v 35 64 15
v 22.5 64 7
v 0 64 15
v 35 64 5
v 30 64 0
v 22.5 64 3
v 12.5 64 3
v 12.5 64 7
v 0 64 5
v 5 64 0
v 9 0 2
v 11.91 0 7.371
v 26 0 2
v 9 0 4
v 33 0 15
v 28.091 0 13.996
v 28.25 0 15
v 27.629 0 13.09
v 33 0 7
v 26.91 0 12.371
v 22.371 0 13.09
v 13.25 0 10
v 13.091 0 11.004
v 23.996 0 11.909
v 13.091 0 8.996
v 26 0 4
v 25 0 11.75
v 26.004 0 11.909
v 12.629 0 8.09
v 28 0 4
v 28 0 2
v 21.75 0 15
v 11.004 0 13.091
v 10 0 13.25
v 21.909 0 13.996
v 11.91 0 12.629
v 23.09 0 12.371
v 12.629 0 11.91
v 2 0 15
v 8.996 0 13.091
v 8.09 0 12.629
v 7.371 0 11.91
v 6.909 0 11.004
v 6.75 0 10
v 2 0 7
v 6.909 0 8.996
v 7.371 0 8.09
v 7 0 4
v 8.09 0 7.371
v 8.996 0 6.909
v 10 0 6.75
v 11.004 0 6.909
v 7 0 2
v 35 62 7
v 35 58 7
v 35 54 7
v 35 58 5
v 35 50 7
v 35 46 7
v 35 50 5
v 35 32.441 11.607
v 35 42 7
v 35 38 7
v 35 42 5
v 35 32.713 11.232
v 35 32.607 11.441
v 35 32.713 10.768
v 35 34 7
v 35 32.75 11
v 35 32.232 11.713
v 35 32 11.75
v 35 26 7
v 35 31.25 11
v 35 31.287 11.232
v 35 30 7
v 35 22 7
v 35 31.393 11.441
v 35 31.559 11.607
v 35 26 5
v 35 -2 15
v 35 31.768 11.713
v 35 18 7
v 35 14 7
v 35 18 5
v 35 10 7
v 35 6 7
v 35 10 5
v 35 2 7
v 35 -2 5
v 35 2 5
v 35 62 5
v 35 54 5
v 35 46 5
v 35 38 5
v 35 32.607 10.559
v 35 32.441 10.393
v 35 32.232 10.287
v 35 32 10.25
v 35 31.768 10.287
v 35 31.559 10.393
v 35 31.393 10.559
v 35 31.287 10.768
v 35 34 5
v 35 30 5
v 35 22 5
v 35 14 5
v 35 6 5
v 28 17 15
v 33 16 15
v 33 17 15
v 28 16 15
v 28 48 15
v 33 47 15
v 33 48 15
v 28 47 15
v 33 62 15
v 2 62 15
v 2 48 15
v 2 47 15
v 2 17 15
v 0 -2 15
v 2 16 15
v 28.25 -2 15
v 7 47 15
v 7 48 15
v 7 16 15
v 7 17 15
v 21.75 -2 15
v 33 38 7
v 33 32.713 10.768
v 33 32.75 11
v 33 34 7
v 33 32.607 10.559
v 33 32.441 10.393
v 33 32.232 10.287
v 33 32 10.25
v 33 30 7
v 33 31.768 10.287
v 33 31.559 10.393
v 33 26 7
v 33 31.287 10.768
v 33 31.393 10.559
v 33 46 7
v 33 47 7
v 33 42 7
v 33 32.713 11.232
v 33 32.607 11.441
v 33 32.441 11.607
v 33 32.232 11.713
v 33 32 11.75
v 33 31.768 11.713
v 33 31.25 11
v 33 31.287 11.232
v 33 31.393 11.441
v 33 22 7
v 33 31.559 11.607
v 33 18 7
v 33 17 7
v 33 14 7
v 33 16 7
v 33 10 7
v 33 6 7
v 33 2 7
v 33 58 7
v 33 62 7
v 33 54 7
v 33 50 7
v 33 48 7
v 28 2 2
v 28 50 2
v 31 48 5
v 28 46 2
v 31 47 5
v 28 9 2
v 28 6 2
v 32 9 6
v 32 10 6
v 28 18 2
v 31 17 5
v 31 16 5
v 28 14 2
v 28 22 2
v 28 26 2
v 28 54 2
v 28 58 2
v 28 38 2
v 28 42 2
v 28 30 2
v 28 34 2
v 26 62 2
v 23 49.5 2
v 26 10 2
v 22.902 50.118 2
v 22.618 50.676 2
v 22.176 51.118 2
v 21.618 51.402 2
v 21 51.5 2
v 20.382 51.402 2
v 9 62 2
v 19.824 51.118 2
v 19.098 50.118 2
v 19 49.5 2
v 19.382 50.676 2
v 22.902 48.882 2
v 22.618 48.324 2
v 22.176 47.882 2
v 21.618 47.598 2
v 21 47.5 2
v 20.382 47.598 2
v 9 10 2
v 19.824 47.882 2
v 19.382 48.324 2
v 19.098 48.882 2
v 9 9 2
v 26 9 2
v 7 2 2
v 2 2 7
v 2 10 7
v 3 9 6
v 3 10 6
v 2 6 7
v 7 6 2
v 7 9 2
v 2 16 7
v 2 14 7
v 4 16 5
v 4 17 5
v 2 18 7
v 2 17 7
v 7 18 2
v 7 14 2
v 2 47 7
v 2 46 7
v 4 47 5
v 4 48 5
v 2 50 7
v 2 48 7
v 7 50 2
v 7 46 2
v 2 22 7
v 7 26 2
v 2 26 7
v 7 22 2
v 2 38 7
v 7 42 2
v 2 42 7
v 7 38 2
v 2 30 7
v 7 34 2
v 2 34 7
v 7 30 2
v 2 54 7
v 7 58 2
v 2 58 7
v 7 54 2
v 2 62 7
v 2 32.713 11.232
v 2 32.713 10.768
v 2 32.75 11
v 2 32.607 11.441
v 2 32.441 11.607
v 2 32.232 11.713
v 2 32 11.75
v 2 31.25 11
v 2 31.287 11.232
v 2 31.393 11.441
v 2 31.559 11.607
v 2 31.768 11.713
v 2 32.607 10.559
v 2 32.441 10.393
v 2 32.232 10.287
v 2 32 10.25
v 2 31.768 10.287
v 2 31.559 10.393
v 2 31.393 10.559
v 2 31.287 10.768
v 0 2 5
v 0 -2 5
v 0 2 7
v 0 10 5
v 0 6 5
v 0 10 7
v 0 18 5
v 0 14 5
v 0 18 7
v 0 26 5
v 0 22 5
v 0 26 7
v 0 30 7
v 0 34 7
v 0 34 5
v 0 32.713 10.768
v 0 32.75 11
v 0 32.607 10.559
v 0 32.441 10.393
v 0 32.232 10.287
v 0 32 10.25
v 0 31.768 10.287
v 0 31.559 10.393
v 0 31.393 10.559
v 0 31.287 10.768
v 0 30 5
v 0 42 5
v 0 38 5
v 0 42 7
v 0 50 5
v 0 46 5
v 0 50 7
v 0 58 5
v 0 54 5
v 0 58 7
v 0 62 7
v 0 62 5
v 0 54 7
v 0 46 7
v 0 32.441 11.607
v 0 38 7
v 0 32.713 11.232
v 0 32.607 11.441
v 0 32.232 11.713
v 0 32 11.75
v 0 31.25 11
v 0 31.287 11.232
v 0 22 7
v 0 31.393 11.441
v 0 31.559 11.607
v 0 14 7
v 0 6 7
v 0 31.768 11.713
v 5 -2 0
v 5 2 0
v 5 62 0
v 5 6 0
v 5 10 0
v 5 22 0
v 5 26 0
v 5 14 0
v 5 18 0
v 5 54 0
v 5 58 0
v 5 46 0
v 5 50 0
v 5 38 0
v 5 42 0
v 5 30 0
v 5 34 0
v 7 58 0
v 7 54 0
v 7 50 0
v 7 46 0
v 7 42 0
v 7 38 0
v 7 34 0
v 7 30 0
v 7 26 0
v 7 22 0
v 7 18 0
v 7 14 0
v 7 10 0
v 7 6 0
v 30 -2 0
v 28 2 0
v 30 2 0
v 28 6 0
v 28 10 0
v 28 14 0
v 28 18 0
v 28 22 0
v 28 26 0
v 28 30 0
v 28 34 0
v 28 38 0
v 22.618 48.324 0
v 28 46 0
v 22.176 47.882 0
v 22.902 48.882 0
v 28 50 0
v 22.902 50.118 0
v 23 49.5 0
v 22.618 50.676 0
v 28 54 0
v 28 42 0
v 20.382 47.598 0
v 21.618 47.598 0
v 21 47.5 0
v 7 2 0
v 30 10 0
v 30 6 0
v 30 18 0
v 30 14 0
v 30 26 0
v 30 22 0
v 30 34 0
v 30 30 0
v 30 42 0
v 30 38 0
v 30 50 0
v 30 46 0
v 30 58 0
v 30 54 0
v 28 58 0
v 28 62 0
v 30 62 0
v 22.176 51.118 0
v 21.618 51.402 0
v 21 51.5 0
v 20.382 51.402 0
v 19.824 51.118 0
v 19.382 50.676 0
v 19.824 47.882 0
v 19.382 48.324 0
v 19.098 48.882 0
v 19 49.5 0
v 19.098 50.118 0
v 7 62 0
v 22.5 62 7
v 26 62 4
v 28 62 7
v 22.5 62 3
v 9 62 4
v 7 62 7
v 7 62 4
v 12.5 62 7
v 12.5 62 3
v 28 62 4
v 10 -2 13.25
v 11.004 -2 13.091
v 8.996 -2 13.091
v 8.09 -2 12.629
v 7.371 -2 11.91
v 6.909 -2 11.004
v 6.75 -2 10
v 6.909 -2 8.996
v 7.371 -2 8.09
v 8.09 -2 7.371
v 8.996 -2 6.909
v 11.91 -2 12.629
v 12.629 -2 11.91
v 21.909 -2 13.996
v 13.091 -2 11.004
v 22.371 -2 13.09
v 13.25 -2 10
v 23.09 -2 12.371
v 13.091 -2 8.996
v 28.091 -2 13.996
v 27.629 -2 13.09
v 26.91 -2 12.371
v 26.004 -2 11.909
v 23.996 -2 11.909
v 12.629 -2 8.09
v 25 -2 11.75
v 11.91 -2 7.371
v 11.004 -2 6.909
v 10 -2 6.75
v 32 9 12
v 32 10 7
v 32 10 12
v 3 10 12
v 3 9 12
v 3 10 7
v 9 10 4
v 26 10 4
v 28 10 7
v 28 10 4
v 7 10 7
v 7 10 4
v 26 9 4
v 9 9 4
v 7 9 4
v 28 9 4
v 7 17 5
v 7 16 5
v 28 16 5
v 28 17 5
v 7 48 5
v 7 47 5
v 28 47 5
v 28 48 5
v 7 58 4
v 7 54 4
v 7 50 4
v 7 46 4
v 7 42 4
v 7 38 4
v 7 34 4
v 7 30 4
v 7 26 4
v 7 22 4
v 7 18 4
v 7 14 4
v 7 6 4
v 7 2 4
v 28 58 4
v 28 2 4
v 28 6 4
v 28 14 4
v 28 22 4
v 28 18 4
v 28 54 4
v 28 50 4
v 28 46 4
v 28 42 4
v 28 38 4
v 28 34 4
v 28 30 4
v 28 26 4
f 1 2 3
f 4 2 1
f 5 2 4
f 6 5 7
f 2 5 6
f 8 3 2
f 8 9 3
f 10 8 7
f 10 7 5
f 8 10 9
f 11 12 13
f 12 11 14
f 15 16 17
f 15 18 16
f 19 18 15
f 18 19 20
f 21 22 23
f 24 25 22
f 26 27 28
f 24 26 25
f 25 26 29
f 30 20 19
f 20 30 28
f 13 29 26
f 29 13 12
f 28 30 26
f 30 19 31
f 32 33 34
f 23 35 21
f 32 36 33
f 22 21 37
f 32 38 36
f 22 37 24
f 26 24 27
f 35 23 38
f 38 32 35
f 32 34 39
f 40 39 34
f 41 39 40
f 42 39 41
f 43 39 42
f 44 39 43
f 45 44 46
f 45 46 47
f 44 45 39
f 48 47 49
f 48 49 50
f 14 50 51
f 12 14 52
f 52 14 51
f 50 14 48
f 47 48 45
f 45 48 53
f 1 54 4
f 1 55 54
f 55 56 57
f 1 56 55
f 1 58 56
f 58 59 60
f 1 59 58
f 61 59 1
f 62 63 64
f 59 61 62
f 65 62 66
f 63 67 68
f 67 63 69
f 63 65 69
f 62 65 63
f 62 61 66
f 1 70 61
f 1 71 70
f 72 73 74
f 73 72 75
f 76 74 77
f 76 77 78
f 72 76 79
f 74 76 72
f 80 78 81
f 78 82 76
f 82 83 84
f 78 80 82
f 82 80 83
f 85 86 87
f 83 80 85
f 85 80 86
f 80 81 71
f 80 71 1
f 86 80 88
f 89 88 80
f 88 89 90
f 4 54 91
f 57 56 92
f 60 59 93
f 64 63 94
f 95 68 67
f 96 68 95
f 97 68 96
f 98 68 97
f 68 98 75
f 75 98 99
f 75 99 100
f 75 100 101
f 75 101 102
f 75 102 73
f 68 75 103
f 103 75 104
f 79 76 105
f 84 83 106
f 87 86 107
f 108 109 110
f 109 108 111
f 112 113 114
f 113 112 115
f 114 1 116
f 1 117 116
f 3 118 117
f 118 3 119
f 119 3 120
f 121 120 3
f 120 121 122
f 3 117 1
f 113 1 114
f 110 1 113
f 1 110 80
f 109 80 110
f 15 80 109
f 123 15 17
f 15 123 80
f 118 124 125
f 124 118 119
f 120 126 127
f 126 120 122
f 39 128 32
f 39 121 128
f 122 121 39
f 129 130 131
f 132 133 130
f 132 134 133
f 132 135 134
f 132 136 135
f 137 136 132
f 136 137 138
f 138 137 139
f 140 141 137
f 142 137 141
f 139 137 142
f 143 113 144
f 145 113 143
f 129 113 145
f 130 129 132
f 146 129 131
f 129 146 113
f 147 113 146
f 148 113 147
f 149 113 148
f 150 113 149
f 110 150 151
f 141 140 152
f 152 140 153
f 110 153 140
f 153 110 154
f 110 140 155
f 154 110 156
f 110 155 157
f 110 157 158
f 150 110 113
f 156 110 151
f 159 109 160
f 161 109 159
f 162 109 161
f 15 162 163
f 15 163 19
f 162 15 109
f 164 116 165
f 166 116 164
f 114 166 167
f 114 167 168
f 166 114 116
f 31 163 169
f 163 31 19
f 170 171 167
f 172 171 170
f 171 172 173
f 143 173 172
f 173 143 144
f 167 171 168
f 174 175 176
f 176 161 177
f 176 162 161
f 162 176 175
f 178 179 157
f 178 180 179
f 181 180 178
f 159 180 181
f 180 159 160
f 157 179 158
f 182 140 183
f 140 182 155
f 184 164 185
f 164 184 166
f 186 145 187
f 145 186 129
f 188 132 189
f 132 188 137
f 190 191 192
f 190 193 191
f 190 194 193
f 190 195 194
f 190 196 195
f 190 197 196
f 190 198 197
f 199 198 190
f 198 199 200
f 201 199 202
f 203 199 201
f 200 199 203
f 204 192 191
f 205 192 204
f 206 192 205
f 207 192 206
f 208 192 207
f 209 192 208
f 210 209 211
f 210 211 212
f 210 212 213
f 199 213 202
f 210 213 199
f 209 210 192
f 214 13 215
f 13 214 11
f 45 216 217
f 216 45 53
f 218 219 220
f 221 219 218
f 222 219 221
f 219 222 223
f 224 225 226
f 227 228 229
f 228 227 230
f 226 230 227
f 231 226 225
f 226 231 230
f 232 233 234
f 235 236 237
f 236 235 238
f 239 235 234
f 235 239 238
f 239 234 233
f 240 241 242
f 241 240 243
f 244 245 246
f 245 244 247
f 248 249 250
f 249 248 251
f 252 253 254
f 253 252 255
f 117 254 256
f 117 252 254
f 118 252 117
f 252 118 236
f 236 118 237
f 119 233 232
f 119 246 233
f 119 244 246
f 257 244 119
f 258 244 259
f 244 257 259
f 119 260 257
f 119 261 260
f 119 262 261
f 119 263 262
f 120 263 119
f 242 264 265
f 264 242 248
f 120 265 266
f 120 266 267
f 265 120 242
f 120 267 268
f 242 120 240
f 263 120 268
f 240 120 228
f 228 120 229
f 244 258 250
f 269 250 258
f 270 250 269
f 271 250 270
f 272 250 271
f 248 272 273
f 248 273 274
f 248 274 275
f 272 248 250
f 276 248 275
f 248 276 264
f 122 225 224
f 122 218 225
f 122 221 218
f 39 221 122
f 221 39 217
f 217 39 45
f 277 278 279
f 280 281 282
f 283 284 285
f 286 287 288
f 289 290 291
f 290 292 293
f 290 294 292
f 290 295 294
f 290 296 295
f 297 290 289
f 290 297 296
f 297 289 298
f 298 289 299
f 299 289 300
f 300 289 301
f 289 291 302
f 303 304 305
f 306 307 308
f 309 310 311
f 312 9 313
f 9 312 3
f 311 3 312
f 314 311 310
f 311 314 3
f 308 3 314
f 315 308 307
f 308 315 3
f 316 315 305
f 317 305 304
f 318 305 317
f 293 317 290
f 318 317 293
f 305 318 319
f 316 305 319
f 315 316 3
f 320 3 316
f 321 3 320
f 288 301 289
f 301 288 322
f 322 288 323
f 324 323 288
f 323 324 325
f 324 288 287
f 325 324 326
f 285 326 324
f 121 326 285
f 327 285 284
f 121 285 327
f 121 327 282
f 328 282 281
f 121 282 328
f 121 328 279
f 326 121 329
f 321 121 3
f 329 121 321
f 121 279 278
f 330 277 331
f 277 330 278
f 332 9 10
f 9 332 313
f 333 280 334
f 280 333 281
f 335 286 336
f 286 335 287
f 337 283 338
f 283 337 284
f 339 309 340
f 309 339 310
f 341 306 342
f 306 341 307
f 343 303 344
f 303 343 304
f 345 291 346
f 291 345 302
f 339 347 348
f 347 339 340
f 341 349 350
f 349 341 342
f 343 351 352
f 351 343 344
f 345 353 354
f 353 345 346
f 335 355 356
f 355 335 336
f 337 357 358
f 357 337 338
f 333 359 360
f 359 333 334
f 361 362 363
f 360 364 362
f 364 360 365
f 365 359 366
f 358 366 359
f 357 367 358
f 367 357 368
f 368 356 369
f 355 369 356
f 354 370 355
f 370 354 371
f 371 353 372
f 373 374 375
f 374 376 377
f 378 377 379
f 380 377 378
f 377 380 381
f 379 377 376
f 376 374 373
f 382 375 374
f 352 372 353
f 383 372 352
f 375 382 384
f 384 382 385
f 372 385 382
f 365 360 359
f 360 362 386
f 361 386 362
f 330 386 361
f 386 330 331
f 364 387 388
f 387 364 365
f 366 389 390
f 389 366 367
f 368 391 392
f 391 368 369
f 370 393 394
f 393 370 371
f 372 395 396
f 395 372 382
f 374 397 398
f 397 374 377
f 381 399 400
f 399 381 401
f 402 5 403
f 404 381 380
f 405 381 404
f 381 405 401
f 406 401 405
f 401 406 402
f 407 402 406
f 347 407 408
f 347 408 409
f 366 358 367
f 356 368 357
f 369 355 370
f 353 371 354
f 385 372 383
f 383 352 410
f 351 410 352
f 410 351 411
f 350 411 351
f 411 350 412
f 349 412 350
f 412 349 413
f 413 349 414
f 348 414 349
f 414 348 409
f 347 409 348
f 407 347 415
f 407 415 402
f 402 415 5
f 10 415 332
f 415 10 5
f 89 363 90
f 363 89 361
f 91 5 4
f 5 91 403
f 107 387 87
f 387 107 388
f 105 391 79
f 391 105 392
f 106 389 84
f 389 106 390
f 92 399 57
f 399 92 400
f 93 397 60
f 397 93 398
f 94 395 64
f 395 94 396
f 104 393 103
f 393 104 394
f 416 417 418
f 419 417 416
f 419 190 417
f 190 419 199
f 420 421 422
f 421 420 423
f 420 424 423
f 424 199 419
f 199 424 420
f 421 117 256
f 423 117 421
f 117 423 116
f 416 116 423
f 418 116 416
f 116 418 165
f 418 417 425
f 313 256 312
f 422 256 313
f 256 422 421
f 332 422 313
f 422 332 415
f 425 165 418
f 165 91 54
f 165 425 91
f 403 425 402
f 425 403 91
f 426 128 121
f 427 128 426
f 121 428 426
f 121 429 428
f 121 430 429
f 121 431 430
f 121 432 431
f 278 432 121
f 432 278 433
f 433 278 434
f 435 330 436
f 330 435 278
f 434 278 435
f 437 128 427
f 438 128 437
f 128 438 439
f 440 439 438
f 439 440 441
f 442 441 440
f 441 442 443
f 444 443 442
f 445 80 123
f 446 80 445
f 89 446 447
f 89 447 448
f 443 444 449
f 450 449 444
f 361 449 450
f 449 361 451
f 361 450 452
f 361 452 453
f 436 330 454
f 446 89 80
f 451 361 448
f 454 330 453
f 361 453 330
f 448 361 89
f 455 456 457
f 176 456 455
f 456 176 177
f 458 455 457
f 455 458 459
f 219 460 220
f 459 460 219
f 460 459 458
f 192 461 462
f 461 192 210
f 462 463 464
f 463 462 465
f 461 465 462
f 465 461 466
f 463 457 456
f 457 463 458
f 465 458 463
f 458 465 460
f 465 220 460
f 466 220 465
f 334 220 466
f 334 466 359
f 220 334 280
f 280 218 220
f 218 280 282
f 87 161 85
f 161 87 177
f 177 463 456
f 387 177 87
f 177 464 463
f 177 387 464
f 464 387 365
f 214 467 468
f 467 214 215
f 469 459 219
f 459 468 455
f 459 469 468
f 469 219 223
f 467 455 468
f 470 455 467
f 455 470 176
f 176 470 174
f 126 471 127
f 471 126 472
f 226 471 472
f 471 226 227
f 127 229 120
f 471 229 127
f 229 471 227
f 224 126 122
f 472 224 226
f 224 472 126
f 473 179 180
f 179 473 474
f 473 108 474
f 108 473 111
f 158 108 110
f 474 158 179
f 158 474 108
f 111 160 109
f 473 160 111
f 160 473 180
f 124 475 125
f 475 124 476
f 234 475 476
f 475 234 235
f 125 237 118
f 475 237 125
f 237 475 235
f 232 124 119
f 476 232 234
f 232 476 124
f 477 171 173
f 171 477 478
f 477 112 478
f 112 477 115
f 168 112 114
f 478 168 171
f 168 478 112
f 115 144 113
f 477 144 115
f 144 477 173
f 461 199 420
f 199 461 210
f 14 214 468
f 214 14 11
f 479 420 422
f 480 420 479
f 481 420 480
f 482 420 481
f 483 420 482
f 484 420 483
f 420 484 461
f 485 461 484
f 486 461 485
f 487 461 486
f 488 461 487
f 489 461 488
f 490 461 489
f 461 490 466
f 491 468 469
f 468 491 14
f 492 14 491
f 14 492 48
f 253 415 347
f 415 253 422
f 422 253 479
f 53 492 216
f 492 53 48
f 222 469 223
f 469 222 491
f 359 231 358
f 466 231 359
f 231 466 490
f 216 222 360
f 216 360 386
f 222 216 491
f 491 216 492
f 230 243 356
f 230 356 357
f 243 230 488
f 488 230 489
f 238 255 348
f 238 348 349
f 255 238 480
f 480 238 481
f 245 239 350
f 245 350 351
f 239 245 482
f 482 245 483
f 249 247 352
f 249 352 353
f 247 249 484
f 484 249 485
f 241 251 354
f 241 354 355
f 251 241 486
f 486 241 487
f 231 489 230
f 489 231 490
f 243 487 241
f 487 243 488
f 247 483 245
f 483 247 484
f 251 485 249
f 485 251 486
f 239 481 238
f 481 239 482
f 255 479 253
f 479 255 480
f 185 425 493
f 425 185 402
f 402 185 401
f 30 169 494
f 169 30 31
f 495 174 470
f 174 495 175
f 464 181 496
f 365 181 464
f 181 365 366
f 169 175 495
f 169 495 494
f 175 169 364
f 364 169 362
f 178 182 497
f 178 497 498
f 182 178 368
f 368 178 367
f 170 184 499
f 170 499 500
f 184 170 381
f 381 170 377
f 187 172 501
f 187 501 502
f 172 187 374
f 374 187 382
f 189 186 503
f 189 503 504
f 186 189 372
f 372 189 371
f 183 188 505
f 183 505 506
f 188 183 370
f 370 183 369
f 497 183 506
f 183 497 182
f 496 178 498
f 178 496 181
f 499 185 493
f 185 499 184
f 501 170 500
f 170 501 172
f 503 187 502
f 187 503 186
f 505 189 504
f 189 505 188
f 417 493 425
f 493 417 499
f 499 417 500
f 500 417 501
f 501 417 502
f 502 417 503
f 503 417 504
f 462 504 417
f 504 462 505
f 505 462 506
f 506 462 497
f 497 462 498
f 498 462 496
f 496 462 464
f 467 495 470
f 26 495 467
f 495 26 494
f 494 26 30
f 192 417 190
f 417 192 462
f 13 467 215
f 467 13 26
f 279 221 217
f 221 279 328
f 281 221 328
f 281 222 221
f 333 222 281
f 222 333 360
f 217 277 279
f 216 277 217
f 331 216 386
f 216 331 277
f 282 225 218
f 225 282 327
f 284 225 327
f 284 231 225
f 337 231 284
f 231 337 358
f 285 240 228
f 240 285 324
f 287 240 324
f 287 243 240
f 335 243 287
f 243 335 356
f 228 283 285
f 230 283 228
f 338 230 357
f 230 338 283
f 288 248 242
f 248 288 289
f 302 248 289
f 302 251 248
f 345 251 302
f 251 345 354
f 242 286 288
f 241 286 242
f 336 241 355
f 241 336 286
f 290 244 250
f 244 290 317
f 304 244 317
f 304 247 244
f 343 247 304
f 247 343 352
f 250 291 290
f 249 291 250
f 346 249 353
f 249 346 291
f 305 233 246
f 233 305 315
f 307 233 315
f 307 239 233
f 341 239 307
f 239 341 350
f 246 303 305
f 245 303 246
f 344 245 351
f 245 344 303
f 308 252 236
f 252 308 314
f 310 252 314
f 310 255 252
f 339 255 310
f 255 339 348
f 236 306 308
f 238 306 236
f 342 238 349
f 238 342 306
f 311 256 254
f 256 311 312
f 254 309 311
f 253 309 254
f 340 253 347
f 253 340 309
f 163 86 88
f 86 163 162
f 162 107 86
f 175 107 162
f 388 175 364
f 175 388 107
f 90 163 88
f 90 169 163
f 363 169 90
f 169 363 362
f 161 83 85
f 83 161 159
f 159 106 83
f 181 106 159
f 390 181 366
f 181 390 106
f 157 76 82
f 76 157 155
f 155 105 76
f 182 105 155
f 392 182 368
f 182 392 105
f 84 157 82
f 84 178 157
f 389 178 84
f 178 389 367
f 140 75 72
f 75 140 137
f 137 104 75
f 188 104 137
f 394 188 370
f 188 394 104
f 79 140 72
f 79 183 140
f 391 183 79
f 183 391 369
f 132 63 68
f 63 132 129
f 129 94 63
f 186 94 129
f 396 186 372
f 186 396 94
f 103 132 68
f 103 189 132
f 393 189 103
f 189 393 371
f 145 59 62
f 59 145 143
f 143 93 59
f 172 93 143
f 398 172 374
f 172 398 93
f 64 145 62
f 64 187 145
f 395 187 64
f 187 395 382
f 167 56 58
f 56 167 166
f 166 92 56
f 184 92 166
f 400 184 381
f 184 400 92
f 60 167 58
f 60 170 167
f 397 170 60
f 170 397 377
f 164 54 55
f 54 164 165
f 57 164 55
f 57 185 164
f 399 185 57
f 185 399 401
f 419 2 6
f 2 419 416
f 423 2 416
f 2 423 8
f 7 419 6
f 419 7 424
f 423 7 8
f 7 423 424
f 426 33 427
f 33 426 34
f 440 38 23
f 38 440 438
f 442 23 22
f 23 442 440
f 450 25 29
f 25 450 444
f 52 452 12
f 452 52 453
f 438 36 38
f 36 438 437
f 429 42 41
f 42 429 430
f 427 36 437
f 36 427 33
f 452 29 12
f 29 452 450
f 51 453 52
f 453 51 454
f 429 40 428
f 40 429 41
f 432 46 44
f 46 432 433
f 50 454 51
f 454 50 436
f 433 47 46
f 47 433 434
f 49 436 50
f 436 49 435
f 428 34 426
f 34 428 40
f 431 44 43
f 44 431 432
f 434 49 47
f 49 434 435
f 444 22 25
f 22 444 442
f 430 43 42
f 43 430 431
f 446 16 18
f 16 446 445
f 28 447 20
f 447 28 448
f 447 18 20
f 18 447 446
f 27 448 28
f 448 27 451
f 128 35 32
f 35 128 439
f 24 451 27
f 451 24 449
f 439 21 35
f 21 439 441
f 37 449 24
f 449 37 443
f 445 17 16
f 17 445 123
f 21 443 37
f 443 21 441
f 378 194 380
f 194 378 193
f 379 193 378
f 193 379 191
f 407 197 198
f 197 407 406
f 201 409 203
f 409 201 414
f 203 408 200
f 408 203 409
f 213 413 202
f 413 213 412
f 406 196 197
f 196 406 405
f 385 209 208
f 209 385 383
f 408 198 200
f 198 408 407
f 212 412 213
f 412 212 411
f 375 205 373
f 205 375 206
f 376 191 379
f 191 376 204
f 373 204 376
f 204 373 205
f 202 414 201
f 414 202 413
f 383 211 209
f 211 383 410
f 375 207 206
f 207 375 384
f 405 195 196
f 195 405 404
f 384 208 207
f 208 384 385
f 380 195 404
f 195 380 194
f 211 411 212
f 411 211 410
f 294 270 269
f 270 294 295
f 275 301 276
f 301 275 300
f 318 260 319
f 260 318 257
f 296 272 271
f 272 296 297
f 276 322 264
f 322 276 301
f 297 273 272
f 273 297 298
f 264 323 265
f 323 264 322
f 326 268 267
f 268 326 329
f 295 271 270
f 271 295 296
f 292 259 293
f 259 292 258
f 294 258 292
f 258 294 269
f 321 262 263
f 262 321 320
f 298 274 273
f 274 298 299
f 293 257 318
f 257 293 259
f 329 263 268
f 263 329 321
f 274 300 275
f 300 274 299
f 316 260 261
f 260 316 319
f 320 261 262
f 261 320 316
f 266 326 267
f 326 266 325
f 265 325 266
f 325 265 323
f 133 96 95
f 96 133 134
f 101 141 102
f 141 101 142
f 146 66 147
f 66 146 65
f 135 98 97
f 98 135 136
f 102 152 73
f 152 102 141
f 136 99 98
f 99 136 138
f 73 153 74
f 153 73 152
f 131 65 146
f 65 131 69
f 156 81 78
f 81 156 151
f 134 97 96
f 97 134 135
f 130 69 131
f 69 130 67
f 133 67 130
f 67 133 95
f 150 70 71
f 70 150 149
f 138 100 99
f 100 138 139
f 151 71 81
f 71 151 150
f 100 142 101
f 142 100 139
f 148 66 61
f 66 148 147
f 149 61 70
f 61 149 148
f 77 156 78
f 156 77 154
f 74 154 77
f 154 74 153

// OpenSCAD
$fn = 20;

thick = 2;
xmax = 35;
ymax = 60+thick;
zmax = 15;

edge=5;

//xmt = xmax + 2*thick;
//ymt = ymax + 2*thick;    

//   shell_bot();

difference() {
    shell_bottom();

    //holes for screws pcb
/*    
    translate([20, 35,0])
        cylinder(4, 3.5, 3.5);
    translate([xmax-20,35,0])
        cylinder(4, 3.5, 3.5);
    translate([21.5,35+118,0])
        cylinder(4, 3.5, 3.5);
    translate([xmax-21.5,35+118,0])
        cylinder(4, 3.5, 3.5);
    
    //bumper
    
    translate([35, 27.5, 0])
        cylinder(1, 1, 1);
    translate([xmax-35, 27.5,0])
        cylinder(1, 1, 1);
    translate([35, ymax-27.5, 0])
        cylinder(1, 1, 1);
    translate([xmax-35, ymax-27.5, 0])
        cylinder(1, 1, 1);
*/    
}


module shell_bottom() {



    difference(){
        base_shape();
        cubes_left();    
        cubes_right();
    translate([xmax/2-5, ymax-1, 3])
        cube([10, 4, 4]);
    translate([10, 2, 10])
        rotate([90,0,0])
            cylinder(h=5, r=3.25);
    translate([25, 2, zmax])
        rotate([90,0,0])
            cylinder(h=5, r=3.25);
    translate([21, 49.5, 0])
        cylinder(r=2, h=4);

    translate([0, ymax/2+1, 11])
        rotate([0,90,0])
            cylinder(r=0.75, h=3);
    translate([xmax-thick, ymax/2+1, 11])
        rotate([0,90,0])
            cylinder(r=0.75, h=3);
    }

    


}



module base_shape() {
    translate([0, ymax+thick, 0])
        rotate([90,0,0]) 
            linear_extrude(ymax+thick)
                base_shape_2d(thick);

    translate([0, ymax+thick])
        base_shape_holder();
    translate([0, 0])
        base_shape_holder();

    translate([3, 9, thick])
        cube([29, 1, 10]);

    translate([thick, 16, 5])
        cube([5, 1, 10]);
    translate([xmax-thick-5, 16, 5])
        cube([5, 1, 10]);
    translate([thick, 47, 5])
        cube([5, 1, 10]);
    translate([xmax-thick-5, 47, 5])
        cube([5, 1, 10]);

    translate([7, 0, thick])
        cube([2,ymax,2]);
    translate([7+19, 0, thick])
        cube([2,ymax,2]);

/*
    //screws holding case together
    translate([edge+5,28,0])
        screw(4);
    translate([xmax-edge-5,28,0])
        screw(4);
    translate([edge+5,ymax-26,0])
        screw(4);
    translate([xmax-edge-5,ymax-26,0])
        screw(4);
    
    //reinforcement front
    translate([0, 17 ,0])
        base_shape_holder();    
    
    //reinforcement in the middle
    translate([0, ymax/2 - 10])
        base_shape_holder();    
    translate([0, ymax/2 + 14])
        base_shape_holder();    

    //reinforcement back
    translate([0, ymax-14 ,0])
        base_shape_holder();    

*/
}

module base_shape_holder() {
    
    rotate([90,0,0])
    linear_extrude(thick)
        base_shape_2da();

}

module base_shape_2da() {
    th = 10;
    polygon([[0, zmax], [0, edge], [edge,0], [xmax-edge, 0], [xmax, edge], [xmax, zmax],/*[xmax-th,zmax], [xmax-th, edge+th], [xmax-edge-th, th],[edge+th, th]*/, [th, edge+th],[th, zmax]]);
}


module base_shape_2d(th) {
    polygon([[0, zmax], [0, edge], [edge,0], [xmax-edge, 0], [xmax, edge], [xmax, zmax],[xmax-th,zmax], [xmax-th, edge+th], [xmax-edge-th, th],[edge+th, th], [th, edge+th],[th, zmax]]);
}

module cubes_left() {
    for(i = [2:8:ymax])
      translate([0, i, 0])
      cube([edge+thick, 4, edge+thick]);
}

module cubes_right() {
    for(i = [2:8:ymax])
      translate([xmax-edge-thick, i, 0])
      cube([edge+thick, 4, edge+thick]);
}
    
module screw(r) {    
    difference() {
        cylinder(zmax,r*1.2,r*1.2);
        translate([0,0,-1]);
            cylinder(zmax+2,r/2+0.2,r/2+0.2);
//        cylinder(5,6,6);
    }
}

module foot(r, h) {    
    difference() {
        cylinder(h,r*2,r*1.3);
            cylinder(h,r/2+0.2,r/2+0.2);
//        cylinder(5,6,6);
    }
}
